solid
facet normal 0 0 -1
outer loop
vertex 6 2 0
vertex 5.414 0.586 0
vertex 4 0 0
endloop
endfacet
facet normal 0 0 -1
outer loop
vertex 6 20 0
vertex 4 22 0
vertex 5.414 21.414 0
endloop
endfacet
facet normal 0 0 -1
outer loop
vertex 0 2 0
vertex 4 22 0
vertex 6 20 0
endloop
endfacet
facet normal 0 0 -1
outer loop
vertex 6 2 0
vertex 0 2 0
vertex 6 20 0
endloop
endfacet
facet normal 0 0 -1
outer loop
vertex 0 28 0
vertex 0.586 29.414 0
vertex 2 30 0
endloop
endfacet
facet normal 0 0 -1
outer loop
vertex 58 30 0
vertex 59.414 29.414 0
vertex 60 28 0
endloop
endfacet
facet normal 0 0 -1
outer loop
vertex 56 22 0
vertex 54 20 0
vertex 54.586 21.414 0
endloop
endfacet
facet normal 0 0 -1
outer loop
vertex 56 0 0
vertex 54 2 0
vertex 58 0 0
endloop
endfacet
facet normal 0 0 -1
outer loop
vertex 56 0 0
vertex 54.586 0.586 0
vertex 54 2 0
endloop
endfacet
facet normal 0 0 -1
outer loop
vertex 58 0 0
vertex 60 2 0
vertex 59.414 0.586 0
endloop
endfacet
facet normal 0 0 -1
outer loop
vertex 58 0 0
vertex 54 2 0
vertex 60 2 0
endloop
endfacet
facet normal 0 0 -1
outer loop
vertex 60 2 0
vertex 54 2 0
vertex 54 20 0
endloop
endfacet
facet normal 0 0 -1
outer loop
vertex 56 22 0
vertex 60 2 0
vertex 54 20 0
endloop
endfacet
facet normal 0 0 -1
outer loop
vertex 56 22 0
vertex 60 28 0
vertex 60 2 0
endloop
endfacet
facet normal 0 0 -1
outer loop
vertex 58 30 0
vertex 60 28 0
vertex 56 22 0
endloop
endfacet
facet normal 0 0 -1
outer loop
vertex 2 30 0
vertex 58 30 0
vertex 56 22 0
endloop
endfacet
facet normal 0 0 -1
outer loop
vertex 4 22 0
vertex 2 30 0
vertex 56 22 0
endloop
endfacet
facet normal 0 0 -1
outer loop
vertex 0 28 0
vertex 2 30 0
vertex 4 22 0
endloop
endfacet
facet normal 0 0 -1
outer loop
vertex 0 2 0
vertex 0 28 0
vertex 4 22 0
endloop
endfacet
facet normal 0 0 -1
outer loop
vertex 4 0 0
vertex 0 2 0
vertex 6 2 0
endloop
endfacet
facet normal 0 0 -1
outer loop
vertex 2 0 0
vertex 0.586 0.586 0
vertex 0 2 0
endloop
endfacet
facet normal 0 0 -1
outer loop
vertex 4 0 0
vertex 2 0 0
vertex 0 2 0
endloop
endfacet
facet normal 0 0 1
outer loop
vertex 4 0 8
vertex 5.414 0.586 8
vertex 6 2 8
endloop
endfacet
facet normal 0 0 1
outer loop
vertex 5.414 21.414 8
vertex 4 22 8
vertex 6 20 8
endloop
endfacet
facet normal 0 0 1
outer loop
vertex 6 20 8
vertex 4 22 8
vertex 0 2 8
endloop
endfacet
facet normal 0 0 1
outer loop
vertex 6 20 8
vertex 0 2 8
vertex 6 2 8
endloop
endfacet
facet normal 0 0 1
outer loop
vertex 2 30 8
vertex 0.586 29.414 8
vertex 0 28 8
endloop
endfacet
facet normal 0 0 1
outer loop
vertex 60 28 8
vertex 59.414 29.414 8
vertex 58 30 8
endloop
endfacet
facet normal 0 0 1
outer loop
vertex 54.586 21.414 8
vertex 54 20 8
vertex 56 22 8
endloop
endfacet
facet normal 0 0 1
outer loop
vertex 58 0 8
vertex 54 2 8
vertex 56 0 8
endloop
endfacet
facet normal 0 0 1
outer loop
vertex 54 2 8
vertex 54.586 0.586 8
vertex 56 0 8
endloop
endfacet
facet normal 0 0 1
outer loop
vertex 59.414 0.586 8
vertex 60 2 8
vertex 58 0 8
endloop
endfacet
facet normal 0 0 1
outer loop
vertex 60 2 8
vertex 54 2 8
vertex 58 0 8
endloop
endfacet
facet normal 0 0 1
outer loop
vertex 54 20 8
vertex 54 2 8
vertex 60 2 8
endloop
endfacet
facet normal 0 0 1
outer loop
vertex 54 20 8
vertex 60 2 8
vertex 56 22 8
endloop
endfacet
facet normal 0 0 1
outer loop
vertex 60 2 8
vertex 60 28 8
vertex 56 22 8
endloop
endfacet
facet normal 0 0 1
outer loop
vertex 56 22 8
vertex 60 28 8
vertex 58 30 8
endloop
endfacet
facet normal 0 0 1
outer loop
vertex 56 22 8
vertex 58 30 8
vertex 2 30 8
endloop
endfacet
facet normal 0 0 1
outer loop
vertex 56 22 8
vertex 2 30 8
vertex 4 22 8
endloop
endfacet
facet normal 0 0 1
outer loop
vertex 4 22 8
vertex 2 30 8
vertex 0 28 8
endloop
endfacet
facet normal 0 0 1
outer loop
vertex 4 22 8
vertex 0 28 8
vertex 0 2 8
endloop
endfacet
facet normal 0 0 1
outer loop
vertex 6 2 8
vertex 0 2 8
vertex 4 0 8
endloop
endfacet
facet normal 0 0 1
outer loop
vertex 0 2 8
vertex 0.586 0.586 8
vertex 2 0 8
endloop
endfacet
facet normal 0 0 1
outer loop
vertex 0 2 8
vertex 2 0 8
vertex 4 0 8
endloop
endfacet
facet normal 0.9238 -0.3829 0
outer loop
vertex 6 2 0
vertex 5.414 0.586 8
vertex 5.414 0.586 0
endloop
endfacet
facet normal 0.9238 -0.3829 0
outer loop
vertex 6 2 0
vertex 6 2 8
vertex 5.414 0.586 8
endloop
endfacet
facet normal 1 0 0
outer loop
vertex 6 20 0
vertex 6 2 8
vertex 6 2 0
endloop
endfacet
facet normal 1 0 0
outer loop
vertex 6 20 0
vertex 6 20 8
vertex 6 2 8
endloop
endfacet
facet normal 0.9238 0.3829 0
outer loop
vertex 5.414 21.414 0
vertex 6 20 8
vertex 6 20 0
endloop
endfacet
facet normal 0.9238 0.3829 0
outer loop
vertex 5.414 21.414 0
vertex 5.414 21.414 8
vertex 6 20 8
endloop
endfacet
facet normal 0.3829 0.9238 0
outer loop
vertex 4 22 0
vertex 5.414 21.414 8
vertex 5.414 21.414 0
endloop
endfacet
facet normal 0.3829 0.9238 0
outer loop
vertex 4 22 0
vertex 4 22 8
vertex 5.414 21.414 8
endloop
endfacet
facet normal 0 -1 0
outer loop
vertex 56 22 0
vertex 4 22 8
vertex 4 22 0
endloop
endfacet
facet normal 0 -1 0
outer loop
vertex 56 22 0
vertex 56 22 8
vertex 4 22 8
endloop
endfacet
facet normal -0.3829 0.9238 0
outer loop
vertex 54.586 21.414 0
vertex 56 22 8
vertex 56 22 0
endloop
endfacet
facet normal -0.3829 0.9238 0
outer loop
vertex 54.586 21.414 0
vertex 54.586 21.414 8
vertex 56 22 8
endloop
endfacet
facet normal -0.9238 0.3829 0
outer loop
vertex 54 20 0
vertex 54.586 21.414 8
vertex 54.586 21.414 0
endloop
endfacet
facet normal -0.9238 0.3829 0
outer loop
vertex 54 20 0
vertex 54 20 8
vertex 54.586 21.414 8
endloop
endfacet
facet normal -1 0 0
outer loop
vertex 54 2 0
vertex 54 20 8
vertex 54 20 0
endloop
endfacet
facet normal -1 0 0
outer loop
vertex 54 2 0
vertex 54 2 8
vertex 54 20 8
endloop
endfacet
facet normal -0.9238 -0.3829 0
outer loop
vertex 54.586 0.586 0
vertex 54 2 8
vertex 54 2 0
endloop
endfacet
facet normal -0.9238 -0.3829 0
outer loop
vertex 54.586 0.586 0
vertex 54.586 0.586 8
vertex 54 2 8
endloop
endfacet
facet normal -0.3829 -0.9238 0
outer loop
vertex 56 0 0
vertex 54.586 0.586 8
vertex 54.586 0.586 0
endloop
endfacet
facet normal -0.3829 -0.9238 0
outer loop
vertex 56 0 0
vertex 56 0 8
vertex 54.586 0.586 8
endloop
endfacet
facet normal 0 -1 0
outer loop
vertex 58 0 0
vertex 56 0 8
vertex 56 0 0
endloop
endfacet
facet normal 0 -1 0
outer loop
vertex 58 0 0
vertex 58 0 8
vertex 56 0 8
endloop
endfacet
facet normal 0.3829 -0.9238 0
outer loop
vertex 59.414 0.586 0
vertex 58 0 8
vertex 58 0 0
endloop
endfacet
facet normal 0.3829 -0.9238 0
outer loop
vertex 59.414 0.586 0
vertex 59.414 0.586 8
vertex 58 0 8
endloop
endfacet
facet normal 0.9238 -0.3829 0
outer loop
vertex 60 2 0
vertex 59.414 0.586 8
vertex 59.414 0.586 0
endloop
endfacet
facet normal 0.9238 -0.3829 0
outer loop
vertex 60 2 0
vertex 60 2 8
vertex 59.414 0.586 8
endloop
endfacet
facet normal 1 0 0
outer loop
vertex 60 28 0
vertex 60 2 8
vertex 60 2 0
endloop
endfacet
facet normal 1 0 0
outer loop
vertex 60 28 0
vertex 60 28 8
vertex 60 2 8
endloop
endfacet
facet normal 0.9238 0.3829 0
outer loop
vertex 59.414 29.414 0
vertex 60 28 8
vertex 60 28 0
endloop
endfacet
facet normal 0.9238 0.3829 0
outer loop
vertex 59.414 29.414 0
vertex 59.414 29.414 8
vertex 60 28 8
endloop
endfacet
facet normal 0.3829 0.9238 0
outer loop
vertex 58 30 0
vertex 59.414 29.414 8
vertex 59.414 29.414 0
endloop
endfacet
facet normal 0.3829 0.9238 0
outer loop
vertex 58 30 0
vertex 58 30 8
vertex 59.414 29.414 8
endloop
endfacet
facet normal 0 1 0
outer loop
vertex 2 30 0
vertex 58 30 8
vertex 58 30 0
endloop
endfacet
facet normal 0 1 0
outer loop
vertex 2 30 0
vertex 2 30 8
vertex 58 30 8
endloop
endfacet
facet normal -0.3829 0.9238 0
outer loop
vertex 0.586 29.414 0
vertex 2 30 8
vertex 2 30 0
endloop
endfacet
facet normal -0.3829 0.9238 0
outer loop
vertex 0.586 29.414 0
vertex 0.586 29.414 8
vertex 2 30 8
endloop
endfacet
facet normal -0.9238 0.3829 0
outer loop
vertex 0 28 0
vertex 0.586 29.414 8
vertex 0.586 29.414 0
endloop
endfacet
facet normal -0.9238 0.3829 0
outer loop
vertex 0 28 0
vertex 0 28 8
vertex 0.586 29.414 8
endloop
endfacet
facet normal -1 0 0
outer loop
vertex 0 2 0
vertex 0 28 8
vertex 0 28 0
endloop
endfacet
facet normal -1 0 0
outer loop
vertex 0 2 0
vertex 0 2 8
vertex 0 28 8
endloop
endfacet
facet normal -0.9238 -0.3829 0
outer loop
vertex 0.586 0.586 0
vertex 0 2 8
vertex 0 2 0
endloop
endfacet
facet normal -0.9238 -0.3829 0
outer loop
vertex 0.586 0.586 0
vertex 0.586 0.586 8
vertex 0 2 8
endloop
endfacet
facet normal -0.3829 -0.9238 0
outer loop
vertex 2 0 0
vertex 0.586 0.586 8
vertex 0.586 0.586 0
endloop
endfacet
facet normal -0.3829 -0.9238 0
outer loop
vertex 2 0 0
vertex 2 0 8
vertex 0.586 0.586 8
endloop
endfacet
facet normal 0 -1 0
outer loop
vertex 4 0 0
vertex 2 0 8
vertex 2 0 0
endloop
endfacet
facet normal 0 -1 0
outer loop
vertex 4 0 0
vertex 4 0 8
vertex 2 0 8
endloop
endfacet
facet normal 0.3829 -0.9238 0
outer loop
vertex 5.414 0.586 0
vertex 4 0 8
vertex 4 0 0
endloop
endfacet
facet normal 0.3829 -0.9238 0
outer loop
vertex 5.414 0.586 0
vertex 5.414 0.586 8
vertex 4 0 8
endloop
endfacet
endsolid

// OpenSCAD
$fn = 32;

// ----------------------------------------------------------------------
// Clip blank: staple clip, 8 mm thick
// ----------------------------------------------------------------------

// --- parameters (mm) ---
profile_height = 8;       // extrusion height
profile_points = 24;      // points of the closed outline

profile = [[0, 2], [0.586, 0.586], [2, 0], [4, 0], [5.414, 0.586], [6, 2], [6, 20], [5.414, 21.414], [4, 22], [56, 22], [54.586, 21.414], [54, 20], [54, 2], [54.586, 0.586], [56, 0], [58, 0], [59.414, 0.586], [60, 2], [60, 28], [59.414, 29.414], [58, 30], [2, 30], [0.586, 29.414], [0, 28]];  // single closed polygon, 24 points, counter clockwise

// --- the one profile operation ---
linear_extrude(height = profile_height) polygon(points = profile);
